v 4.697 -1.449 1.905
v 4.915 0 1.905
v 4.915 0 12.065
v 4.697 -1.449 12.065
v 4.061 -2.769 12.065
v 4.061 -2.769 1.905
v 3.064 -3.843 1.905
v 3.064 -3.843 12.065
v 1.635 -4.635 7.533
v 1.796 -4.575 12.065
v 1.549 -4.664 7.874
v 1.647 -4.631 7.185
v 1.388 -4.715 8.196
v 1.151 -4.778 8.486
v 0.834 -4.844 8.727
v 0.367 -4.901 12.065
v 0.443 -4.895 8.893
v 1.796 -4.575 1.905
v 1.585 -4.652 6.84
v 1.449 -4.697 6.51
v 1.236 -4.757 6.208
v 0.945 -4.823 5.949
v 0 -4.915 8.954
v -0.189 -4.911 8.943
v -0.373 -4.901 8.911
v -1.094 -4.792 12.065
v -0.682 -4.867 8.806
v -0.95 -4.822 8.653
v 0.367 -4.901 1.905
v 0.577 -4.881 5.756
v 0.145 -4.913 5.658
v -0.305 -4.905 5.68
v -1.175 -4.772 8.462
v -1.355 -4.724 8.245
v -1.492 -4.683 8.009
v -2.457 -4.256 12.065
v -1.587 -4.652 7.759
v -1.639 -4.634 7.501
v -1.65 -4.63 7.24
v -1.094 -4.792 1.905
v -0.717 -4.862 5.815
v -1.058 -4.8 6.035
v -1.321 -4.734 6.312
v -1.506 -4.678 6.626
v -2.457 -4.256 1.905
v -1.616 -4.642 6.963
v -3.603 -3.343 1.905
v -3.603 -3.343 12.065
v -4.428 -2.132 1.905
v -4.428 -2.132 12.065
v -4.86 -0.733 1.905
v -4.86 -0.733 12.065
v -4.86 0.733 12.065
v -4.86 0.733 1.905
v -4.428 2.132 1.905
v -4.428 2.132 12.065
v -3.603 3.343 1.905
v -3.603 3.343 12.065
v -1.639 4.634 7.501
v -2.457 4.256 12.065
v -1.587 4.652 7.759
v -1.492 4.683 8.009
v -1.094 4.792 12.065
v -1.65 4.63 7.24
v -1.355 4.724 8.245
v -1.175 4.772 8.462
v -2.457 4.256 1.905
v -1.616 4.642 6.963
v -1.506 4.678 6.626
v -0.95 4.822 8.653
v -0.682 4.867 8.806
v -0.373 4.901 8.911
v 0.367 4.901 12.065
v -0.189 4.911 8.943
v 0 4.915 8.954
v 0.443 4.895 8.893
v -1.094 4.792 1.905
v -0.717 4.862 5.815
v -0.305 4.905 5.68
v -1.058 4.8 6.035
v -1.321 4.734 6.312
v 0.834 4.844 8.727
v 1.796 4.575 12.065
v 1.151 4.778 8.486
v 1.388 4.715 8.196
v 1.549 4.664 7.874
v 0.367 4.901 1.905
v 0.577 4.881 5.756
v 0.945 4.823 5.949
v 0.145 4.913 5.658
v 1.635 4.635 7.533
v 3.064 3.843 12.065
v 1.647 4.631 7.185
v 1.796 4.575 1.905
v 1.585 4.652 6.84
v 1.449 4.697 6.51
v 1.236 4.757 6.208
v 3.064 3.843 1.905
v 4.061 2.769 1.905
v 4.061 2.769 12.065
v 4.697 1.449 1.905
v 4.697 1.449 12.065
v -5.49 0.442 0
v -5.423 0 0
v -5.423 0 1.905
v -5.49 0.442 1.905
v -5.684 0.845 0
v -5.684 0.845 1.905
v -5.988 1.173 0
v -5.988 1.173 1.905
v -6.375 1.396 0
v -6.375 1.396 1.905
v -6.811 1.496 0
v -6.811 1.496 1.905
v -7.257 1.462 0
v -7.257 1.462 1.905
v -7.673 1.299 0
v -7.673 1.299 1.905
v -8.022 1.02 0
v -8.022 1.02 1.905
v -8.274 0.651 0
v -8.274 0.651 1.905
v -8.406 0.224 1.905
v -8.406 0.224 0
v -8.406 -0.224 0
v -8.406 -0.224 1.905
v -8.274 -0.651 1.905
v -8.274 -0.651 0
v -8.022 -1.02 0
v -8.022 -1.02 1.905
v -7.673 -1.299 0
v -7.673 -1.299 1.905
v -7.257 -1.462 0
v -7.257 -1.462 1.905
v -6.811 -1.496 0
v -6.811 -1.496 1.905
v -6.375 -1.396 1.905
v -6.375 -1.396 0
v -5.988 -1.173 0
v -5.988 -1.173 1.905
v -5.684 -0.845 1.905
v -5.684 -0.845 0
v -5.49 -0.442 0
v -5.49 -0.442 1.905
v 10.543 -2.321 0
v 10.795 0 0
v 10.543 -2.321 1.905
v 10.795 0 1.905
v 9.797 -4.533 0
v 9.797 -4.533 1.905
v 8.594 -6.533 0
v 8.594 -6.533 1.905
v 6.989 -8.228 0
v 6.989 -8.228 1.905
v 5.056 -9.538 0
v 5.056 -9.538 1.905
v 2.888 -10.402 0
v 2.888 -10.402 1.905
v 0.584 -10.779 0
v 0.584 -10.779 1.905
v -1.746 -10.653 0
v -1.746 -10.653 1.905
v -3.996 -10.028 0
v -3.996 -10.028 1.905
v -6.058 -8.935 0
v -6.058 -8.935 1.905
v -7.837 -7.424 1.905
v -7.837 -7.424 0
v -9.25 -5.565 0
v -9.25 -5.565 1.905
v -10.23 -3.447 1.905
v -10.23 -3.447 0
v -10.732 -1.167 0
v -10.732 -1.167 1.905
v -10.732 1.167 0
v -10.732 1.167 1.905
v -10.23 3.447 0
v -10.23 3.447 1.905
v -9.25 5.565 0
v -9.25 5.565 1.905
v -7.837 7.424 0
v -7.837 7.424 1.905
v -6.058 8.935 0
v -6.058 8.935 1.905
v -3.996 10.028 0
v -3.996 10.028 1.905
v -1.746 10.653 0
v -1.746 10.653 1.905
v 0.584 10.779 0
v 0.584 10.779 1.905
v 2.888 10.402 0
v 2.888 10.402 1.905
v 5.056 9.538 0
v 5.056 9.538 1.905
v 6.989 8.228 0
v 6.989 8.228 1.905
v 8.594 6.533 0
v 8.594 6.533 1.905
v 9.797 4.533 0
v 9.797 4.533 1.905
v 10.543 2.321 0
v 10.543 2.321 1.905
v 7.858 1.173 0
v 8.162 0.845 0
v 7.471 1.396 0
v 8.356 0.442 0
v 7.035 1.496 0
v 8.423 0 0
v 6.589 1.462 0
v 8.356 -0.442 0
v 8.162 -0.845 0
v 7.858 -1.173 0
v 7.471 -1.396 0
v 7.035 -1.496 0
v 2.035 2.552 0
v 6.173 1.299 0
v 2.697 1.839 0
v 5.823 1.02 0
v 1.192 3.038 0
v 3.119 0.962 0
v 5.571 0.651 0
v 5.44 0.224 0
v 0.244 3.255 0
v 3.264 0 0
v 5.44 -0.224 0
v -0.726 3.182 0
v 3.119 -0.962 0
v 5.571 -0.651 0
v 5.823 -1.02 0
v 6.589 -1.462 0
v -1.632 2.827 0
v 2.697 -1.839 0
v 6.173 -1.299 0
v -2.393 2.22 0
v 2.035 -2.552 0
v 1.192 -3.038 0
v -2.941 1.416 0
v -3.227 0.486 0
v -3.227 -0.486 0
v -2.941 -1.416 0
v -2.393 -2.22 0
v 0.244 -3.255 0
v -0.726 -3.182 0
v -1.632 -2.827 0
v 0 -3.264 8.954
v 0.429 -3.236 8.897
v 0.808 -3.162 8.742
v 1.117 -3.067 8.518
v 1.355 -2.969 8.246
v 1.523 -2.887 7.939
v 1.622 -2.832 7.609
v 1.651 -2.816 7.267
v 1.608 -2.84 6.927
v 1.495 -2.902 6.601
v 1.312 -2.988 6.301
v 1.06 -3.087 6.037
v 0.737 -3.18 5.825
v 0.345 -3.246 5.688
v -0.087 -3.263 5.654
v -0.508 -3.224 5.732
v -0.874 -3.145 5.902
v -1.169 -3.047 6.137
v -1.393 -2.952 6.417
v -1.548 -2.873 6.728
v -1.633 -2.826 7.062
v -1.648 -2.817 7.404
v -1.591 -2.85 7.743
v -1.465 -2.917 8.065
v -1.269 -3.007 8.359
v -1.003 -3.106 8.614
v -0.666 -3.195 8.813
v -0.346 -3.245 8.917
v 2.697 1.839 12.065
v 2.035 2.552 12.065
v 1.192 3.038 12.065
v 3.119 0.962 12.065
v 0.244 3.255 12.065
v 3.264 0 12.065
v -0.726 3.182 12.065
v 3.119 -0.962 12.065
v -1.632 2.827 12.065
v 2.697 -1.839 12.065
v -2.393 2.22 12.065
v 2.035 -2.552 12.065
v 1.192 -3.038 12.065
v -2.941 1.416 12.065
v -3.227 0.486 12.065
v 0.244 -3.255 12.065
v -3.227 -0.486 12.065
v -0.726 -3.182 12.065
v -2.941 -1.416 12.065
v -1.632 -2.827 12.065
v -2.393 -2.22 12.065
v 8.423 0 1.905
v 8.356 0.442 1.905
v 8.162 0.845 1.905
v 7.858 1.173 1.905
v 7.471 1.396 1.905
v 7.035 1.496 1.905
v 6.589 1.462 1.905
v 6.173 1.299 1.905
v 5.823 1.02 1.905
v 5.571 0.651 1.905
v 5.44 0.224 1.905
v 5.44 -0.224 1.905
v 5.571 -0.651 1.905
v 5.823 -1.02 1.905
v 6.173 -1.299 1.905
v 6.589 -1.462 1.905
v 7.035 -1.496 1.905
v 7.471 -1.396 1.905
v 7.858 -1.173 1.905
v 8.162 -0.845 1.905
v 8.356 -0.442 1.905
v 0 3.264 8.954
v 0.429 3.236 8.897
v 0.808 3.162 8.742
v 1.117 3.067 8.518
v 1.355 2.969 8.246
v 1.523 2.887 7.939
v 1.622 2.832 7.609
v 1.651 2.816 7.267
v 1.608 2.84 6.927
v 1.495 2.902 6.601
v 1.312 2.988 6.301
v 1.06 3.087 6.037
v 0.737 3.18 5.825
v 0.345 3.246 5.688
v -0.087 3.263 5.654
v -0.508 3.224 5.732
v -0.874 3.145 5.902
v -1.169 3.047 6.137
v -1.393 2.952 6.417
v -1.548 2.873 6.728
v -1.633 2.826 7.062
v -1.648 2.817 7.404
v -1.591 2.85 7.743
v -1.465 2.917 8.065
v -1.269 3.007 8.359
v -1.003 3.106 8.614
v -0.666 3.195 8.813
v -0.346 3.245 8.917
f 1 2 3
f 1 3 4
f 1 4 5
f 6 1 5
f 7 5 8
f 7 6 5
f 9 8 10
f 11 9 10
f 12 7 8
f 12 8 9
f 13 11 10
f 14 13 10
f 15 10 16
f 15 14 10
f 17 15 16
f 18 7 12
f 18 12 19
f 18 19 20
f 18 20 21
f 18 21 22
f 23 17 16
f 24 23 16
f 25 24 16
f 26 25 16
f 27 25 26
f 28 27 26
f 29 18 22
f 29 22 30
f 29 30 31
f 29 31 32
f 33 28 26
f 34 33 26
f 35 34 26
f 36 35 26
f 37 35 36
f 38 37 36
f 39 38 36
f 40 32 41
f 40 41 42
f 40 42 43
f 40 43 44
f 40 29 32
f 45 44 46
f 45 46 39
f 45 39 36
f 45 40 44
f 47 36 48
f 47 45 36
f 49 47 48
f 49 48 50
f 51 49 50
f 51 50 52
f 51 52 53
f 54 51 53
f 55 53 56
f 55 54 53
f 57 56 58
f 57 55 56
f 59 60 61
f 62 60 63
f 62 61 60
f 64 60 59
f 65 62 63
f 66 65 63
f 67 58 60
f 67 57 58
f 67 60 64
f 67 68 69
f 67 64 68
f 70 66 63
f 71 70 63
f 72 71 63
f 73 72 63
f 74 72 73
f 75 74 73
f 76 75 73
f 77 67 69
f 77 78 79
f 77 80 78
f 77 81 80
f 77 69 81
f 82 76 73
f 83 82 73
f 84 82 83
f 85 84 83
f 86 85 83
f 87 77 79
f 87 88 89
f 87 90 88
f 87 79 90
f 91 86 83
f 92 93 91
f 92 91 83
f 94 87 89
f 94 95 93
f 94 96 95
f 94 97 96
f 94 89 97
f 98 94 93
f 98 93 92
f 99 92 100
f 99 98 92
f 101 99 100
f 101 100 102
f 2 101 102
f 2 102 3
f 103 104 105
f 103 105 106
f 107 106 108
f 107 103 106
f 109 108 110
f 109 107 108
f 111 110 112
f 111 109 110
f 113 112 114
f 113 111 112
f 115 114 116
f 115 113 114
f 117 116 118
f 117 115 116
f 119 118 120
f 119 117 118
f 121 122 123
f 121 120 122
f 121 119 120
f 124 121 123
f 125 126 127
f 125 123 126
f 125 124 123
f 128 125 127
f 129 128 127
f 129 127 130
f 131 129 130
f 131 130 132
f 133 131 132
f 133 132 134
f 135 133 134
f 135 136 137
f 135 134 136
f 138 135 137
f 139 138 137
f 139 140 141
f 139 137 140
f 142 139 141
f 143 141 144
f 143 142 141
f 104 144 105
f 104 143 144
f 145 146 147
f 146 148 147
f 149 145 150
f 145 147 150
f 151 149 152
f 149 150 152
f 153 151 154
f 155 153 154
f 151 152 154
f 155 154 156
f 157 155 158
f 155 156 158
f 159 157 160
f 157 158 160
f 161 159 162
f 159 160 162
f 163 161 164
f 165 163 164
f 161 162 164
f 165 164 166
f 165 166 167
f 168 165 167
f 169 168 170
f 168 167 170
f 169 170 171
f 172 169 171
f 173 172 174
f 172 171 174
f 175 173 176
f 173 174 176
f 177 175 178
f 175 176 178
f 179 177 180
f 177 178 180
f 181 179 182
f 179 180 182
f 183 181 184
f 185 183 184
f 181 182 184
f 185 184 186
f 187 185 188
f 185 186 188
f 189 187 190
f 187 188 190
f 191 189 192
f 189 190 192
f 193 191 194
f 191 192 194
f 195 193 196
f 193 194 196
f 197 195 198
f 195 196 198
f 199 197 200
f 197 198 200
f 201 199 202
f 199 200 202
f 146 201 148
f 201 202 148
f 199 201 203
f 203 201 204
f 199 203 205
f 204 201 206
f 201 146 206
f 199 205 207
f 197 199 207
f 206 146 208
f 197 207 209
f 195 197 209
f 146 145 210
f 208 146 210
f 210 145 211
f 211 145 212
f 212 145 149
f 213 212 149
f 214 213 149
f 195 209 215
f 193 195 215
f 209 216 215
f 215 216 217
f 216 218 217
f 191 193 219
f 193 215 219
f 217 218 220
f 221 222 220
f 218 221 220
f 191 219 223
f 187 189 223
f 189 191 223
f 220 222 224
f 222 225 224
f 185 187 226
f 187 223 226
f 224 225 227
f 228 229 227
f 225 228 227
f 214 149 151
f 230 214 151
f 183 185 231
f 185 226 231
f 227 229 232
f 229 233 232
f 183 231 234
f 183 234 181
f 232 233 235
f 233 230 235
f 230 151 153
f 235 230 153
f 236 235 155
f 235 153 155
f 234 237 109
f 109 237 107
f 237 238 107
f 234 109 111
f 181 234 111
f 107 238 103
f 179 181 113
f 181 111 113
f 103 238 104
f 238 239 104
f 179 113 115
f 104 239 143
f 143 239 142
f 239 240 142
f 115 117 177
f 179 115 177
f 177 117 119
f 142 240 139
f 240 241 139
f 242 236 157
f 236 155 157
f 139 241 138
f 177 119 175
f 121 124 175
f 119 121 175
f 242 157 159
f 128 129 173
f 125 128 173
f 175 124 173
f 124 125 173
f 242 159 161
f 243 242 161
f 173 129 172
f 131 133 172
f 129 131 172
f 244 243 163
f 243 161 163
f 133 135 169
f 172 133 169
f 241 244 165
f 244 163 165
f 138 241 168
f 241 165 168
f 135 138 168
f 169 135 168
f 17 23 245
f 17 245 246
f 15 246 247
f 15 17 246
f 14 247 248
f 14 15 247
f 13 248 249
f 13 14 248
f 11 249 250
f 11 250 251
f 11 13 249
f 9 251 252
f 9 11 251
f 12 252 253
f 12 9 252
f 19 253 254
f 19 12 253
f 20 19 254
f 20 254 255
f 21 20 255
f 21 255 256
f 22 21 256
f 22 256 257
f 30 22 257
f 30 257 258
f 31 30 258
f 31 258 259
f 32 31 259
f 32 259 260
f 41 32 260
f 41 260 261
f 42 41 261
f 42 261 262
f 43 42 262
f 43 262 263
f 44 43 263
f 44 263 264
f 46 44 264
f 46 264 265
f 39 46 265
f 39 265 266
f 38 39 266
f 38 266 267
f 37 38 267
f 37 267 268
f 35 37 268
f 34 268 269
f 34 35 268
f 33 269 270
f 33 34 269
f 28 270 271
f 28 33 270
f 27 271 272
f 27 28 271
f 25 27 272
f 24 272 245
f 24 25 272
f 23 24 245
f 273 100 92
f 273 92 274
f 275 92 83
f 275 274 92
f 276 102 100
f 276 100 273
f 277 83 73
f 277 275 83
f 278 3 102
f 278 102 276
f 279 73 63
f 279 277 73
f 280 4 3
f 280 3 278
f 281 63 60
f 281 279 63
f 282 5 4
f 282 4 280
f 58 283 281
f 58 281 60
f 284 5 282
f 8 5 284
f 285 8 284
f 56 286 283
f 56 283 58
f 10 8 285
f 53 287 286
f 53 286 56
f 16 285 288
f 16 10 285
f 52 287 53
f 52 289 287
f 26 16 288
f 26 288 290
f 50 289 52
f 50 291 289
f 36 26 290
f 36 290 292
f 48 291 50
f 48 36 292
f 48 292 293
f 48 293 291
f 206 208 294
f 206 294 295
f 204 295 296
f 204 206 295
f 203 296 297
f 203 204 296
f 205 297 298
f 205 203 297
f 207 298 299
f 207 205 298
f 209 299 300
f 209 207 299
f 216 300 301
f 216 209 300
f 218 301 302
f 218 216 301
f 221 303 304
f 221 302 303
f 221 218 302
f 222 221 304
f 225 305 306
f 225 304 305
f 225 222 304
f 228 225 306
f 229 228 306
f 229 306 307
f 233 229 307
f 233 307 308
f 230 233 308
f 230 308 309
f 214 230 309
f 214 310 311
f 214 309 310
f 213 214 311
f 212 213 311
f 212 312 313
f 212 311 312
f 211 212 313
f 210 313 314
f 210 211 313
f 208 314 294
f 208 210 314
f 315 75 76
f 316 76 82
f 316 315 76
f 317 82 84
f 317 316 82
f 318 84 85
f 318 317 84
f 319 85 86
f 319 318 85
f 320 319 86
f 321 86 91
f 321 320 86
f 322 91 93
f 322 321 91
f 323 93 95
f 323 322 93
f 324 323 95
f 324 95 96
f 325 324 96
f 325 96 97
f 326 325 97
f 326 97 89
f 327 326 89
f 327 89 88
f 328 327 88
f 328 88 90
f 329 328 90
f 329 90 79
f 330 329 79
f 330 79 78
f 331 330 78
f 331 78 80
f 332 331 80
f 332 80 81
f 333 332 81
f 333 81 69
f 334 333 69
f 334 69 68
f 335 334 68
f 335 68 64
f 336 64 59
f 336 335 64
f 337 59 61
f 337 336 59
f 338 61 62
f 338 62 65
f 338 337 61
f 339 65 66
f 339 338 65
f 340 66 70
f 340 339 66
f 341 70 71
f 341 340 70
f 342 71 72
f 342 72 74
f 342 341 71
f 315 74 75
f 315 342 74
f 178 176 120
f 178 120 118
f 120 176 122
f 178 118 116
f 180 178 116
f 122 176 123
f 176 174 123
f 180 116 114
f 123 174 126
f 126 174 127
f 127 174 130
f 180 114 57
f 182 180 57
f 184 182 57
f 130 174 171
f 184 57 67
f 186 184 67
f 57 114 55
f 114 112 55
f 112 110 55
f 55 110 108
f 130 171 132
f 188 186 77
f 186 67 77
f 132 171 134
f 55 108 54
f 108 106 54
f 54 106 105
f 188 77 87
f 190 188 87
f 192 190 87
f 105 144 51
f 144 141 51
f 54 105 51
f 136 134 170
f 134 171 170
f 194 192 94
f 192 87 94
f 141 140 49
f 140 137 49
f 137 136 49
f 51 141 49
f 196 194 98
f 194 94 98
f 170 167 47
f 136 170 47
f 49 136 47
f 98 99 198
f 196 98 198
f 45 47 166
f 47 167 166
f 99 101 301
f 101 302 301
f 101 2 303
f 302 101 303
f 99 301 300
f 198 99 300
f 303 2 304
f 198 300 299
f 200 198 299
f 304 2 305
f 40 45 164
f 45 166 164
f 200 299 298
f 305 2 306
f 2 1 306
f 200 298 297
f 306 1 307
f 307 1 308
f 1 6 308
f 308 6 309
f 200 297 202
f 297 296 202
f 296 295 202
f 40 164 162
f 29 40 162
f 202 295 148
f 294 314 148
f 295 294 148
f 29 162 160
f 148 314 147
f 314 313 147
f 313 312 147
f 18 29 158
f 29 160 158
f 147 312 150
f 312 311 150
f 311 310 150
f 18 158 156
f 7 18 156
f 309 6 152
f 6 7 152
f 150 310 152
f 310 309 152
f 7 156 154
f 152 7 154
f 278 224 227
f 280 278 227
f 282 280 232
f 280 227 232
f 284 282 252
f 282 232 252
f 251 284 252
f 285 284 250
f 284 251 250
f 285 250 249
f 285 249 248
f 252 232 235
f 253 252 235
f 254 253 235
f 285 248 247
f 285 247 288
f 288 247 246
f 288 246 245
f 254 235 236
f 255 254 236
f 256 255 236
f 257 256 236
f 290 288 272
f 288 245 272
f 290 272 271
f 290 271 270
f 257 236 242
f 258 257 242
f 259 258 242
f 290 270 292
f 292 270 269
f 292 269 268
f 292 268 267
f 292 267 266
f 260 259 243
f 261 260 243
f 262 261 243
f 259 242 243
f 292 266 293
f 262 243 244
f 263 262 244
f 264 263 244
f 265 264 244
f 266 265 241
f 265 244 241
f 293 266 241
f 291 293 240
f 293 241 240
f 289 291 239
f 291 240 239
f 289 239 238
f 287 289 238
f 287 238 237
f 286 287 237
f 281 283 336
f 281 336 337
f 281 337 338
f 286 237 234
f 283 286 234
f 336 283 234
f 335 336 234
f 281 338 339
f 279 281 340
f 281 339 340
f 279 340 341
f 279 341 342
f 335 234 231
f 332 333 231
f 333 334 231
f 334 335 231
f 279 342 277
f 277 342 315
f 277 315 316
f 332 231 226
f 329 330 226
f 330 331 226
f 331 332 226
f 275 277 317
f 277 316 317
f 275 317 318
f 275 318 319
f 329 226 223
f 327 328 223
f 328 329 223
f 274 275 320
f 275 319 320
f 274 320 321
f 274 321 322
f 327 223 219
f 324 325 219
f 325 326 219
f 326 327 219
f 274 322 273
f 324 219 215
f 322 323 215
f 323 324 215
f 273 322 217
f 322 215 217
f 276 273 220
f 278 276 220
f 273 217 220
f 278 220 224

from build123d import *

# Parameters (mm, degrees)
CUT_EXTRUDE1_DEPTH      = 20.458372876
CUT_EXTRUDE1_DEPTH_BACK = 20.458372876
SKETCH2_R               = 1.651
CUT_EXTRUDE2_DEPTH      = 19.338201985
CUT_EXTRUDE2_DEPTH_BACK = 19.338201985
SKETCH3_R               = 1.5


with BuildPart() as part:
    # Sketch1 → Revolve1 (revolve)
    with BuildSketch(Plane(origin=(0, 0, 0), x_dir=(0, 0, -1), z_dir=(1, 0, 0))):
        Polygon((-1.905, 4.9149), (-12.065, 4.9149), (-12.065, 3.2639), (0, 3.2639), (0, 10.795), (-1.905, 10.795), align=None)
    revolve(axis=Axis((0, 0, 9.576838869), (0, 0, -1)))

    # Sketch2 → Cut-Extrude1 (cut, two sides: drawn at the far end of the back side and taken through both)
    with BuildSketch(Plane(origin=(0, 0, 0), x_dir=(1, 0, 0), z_dir=(0, 1, 0)).offset(-CUT_EXTRUDE1_DEPTH_BACK)):
        with Locations((0, -7.3025)):
            Circle(SKETCH2_R)
    extrude(amount=CUT_EXTRUDE1_DEPTH + CUT_EXTRUDE1_DEPTH_BACK, mode=Mode.SUBTRACT)

    # Sketch3 → Cut-Extrude2 (cut, two sides: drawn at the far end of the back side and taken through both)
    with BuildSketch(Plane.XY.offset(1.905).offset(-CUT_EXTRUDE2_DEPTH_BACK)):
        with Locations((-6.9229, 0)):
            Circle(SKETCH3_R)
        with Locations((6.9229, 0)):
            Circle(SKETCH3_R)
    extrude(amount=CUT_EXTRUDE2_DEPTH + CUT_EXTRUDE2_DEPTH_BACK, mode=Mode.SUBTRACT)


solid = part.part
